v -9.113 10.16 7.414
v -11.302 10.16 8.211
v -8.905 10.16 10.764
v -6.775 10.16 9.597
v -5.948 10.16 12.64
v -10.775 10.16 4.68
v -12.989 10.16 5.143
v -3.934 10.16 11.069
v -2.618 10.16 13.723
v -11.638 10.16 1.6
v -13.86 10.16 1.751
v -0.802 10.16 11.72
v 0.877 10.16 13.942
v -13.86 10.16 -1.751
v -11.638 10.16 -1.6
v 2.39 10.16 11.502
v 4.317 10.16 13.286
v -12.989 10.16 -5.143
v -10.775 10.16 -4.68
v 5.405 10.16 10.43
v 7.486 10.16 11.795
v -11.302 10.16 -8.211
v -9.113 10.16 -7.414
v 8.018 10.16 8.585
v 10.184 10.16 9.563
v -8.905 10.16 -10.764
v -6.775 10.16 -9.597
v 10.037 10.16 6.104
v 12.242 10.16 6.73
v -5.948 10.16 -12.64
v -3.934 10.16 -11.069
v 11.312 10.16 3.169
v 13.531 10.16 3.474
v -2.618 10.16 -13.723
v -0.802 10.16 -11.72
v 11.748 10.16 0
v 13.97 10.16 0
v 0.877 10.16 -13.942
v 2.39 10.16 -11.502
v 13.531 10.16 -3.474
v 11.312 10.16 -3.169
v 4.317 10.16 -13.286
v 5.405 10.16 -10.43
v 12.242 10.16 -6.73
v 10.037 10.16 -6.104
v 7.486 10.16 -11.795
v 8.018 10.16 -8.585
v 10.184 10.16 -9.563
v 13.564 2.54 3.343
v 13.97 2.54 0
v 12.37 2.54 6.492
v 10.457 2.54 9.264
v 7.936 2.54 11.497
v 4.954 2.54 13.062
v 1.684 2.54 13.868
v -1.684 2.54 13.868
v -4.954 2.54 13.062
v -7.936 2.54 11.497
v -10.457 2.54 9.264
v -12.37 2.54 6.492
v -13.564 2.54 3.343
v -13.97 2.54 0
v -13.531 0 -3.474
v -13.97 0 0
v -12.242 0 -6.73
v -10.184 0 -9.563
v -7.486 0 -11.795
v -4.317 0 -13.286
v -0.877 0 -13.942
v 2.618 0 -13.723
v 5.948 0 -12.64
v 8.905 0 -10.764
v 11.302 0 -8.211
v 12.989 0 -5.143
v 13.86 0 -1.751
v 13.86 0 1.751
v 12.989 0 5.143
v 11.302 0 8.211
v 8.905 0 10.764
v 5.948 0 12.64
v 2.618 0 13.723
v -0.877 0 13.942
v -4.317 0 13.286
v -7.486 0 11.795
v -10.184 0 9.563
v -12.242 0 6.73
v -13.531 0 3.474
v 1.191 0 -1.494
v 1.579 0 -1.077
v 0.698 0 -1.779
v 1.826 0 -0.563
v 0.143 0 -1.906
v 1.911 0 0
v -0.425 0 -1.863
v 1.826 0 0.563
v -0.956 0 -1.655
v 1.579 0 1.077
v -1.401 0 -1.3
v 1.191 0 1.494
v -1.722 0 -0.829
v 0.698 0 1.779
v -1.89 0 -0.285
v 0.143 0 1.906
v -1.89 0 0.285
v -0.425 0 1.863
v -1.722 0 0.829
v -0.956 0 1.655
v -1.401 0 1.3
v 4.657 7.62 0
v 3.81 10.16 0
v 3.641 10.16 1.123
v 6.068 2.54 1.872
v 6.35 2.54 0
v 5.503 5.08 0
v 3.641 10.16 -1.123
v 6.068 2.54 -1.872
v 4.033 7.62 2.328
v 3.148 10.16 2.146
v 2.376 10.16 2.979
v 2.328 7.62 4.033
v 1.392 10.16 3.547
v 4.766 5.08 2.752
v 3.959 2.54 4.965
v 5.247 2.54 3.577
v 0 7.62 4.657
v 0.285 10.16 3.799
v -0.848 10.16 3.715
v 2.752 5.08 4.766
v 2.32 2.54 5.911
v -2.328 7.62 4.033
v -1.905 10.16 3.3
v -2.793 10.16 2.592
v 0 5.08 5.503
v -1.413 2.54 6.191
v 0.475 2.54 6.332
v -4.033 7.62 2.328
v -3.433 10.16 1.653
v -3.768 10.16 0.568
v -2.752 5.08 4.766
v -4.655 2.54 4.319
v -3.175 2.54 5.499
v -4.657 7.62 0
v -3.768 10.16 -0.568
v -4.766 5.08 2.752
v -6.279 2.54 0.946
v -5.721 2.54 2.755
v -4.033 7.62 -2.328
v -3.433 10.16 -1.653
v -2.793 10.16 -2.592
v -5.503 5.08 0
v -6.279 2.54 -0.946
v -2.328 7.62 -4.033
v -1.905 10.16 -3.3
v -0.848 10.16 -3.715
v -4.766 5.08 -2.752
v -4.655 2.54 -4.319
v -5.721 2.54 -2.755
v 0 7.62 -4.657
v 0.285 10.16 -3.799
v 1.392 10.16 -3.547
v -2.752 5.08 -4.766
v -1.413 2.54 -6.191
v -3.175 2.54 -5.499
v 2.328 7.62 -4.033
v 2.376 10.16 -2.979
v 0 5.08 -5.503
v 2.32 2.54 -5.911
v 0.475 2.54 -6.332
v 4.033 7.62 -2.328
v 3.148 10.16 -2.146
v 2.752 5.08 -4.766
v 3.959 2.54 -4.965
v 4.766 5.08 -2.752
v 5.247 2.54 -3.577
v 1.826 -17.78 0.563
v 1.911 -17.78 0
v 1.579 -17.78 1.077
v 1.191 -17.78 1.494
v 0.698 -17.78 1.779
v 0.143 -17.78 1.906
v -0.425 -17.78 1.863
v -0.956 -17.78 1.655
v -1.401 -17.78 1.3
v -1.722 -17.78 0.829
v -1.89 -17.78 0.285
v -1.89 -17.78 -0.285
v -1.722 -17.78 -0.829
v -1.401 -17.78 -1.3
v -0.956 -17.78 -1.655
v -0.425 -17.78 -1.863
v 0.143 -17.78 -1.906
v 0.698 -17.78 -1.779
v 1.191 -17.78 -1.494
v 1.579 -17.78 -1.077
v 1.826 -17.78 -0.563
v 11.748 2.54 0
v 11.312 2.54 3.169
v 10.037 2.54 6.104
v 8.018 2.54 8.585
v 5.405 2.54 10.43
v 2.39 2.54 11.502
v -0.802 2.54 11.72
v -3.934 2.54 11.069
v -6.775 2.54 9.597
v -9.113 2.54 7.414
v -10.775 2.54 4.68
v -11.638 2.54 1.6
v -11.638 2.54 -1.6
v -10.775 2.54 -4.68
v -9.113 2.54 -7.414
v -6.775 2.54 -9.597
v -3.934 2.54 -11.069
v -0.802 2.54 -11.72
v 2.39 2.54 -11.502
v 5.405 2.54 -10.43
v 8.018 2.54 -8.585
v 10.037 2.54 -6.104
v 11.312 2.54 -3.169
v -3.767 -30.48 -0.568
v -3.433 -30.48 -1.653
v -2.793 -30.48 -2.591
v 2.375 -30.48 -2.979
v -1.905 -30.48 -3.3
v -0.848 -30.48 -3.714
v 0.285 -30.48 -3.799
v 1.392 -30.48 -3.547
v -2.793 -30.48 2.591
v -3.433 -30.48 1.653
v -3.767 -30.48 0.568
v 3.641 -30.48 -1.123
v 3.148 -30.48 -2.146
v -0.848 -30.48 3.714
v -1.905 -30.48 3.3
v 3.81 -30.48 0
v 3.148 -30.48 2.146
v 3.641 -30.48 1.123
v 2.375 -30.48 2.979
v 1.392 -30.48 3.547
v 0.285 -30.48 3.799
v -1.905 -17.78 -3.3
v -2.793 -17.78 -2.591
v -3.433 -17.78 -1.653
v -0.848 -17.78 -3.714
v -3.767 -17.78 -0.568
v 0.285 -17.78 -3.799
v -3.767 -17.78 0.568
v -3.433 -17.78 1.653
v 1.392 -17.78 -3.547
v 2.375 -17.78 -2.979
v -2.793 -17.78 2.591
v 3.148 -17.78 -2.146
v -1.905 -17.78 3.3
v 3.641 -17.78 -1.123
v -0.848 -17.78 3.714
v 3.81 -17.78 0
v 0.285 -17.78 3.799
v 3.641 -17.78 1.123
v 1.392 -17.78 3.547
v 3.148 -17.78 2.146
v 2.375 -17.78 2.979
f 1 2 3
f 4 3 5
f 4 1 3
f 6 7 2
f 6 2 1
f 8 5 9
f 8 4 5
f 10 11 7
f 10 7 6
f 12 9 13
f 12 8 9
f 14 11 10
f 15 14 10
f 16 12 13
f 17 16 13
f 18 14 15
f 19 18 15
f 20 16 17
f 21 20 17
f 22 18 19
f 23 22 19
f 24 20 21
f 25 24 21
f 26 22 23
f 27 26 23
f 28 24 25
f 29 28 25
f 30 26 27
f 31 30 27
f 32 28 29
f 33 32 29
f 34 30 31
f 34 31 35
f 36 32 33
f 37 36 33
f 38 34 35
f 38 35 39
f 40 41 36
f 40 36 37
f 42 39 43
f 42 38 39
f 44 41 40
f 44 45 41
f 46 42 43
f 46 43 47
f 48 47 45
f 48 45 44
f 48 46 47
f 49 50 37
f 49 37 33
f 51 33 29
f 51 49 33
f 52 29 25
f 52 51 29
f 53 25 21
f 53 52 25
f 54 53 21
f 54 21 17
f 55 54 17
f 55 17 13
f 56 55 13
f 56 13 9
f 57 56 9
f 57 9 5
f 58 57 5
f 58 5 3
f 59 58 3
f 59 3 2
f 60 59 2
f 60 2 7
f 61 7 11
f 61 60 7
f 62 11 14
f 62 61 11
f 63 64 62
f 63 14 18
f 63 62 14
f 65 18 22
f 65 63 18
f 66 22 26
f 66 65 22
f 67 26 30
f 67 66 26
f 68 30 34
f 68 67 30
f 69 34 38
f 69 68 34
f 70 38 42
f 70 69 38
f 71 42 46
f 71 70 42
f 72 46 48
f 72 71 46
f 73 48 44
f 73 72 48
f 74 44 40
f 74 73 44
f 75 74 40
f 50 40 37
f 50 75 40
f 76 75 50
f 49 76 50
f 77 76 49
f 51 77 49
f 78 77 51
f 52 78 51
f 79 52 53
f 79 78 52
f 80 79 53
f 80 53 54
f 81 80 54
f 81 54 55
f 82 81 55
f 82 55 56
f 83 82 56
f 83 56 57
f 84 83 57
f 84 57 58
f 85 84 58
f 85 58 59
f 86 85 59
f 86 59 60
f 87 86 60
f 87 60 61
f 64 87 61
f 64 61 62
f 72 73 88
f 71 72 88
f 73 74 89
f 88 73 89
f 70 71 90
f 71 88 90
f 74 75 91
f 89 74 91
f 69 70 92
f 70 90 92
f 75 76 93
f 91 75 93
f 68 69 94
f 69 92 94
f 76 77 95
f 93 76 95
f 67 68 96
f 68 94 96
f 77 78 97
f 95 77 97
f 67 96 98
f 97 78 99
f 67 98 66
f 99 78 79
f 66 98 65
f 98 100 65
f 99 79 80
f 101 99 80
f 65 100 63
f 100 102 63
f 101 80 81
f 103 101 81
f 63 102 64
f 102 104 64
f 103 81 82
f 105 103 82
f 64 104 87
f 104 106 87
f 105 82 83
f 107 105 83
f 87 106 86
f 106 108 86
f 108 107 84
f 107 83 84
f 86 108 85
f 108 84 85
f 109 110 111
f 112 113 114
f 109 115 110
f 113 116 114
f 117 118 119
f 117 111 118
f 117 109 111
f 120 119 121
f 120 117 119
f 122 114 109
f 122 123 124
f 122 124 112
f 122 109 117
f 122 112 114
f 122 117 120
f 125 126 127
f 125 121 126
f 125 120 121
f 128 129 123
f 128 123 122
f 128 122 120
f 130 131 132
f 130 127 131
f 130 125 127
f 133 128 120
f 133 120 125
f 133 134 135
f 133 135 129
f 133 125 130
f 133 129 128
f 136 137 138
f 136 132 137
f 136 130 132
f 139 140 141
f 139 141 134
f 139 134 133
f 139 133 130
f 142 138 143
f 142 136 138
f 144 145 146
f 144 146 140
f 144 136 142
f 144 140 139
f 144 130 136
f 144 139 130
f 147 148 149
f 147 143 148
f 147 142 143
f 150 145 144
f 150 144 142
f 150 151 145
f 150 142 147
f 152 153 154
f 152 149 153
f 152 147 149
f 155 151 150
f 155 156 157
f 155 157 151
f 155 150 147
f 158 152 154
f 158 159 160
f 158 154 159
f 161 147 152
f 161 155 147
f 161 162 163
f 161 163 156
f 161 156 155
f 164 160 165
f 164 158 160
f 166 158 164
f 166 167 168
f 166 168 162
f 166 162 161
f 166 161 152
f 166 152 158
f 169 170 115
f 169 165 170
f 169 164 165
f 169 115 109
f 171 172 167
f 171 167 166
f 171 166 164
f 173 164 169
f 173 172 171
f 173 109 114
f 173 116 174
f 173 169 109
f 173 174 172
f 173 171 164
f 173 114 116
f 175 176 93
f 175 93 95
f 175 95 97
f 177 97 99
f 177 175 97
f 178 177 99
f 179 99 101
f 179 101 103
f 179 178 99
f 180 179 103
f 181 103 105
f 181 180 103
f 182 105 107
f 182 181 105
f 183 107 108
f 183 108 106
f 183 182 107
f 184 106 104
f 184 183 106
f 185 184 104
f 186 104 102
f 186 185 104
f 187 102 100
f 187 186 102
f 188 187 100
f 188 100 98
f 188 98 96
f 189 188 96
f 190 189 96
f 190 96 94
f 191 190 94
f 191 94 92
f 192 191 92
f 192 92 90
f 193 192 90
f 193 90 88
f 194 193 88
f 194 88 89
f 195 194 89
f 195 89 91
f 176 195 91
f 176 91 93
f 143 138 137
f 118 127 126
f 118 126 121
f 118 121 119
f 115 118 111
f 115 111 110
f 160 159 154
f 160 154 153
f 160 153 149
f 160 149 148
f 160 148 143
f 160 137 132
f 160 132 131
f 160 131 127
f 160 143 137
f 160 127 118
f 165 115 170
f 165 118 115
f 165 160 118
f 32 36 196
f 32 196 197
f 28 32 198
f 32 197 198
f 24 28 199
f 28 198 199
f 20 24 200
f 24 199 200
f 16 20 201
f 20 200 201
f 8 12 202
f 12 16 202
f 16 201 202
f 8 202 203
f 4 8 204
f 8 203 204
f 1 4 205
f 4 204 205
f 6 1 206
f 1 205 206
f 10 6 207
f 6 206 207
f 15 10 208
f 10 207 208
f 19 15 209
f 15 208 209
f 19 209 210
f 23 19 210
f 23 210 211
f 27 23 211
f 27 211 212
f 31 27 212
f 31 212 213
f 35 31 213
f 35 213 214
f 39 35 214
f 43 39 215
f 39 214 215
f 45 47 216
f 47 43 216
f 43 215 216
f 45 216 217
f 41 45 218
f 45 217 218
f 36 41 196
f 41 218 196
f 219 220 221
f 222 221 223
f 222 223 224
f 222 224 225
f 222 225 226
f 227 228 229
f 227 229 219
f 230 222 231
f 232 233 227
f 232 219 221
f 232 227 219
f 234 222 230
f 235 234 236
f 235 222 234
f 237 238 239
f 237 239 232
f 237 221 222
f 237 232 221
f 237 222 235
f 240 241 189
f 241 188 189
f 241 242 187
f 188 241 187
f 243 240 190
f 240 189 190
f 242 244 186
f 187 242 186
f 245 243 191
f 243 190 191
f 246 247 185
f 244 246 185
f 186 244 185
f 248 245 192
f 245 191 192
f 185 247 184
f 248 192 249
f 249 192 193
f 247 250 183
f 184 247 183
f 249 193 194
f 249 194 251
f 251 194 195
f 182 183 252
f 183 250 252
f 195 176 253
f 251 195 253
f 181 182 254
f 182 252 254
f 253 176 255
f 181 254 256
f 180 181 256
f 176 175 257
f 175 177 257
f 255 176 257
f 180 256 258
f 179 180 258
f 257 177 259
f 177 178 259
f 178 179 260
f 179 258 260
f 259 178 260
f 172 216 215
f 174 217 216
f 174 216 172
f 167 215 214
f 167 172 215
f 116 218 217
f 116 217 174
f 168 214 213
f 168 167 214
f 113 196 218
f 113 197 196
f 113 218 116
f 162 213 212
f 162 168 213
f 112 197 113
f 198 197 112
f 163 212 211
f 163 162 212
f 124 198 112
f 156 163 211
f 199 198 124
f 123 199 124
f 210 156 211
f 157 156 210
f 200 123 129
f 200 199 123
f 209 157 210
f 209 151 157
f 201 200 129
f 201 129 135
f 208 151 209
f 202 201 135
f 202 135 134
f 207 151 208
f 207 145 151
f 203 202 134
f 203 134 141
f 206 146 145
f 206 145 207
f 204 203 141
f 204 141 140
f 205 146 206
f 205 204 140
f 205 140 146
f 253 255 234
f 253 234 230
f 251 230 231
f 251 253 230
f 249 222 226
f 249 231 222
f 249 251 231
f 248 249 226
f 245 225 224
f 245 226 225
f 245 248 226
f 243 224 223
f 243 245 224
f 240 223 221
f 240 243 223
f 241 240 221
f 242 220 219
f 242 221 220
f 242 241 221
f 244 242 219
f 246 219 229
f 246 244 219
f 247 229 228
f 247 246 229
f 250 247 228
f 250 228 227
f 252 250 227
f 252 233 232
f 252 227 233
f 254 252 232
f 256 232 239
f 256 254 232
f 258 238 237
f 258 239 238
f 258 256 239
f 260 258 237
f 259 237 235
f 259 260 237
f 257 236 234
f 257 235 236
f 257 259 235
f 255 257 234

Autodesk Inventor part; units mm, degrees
ref_plane "YZ Plane" through (0, 0, 0) normal (1, 0, 0) x (0, 1, 0)
ref_plane "XZ Plane" through (0, 0, 0) normal (0, 1, 0) x (-1, 0, 0)
ref_plane "XY Plane" through (0, 0, 0) normal (0, 0, 1) x (1, 0, 0)
sketch "Sketch1" plane through (0, 0, 0) normal (0, 1, 0) x (-1, 0, 0)
  circle A0 centre (0, 0) radius 13.97
  dimension "d0" = 27.94
extrude "Extrusion1" add sketch "Sketch1" along normal blind 2.54
sketch "Sketch2" plane through (0, 2.54, 0) normal (0, 1, 0) x (1, 0, 0)
  circle A0 centre (0, 0) radius 13.97
  circle A1 centre (0, 0) radius 11.7475
  dimension "d3" = 23.495
extrude "Extrusion2" add sketch "Sketch2" along normal blind 7.62
sketch "Sketch3" plane through (0, 2.54, 0) normal (0, 1, 0) x (1, 0, 0)
  circle A0 centre (0, 0) radius 6.35
  dimension "d6" = 12.7
extrude "Extrusion3" add sketch "Sketch3" along normal blind 7.62
chamfer "Chamfer1" distance 2.54 distance2 7.62 1 edges at (-6.35, 10.16, 0) measured on face at (-1.8127, 10.16, 0.4771)
sketch "Sketch4" plane through (0, 0, 0) normal (0, -1, 0) x (1, 0, 0)
  circle A0 centre (0, 0) radius 3.81
  dimension "d12" = 7.62
extrude "Extrusion4" add sketch "Sketch4" along normal blind 17.78
sketch "Sketch5" plane through (0, -17.78, 0) normal (0, -1, 0) x (1, 0, 0)
  circle A0 centre (0, 0) radius 1.911
  circle A1 centre (0, 0) radius 3.81
  circle A2 centre (0, 0) radius 1.911
extrude "Extrusion5" cut sketch "Sketch5" against normal blind 17.78
sketch "Sketch6" plane through (0, -17.78, 0) normal (0, -1, 0) x (1, 0, 0)
  circle A0 centre (0, 0) radius 3.81
  dimension "d17" = 7.62
extrude "Extrusion6" add sketch "Sketch6" along normal blind 12.7
properties part number "cap_20mL"
